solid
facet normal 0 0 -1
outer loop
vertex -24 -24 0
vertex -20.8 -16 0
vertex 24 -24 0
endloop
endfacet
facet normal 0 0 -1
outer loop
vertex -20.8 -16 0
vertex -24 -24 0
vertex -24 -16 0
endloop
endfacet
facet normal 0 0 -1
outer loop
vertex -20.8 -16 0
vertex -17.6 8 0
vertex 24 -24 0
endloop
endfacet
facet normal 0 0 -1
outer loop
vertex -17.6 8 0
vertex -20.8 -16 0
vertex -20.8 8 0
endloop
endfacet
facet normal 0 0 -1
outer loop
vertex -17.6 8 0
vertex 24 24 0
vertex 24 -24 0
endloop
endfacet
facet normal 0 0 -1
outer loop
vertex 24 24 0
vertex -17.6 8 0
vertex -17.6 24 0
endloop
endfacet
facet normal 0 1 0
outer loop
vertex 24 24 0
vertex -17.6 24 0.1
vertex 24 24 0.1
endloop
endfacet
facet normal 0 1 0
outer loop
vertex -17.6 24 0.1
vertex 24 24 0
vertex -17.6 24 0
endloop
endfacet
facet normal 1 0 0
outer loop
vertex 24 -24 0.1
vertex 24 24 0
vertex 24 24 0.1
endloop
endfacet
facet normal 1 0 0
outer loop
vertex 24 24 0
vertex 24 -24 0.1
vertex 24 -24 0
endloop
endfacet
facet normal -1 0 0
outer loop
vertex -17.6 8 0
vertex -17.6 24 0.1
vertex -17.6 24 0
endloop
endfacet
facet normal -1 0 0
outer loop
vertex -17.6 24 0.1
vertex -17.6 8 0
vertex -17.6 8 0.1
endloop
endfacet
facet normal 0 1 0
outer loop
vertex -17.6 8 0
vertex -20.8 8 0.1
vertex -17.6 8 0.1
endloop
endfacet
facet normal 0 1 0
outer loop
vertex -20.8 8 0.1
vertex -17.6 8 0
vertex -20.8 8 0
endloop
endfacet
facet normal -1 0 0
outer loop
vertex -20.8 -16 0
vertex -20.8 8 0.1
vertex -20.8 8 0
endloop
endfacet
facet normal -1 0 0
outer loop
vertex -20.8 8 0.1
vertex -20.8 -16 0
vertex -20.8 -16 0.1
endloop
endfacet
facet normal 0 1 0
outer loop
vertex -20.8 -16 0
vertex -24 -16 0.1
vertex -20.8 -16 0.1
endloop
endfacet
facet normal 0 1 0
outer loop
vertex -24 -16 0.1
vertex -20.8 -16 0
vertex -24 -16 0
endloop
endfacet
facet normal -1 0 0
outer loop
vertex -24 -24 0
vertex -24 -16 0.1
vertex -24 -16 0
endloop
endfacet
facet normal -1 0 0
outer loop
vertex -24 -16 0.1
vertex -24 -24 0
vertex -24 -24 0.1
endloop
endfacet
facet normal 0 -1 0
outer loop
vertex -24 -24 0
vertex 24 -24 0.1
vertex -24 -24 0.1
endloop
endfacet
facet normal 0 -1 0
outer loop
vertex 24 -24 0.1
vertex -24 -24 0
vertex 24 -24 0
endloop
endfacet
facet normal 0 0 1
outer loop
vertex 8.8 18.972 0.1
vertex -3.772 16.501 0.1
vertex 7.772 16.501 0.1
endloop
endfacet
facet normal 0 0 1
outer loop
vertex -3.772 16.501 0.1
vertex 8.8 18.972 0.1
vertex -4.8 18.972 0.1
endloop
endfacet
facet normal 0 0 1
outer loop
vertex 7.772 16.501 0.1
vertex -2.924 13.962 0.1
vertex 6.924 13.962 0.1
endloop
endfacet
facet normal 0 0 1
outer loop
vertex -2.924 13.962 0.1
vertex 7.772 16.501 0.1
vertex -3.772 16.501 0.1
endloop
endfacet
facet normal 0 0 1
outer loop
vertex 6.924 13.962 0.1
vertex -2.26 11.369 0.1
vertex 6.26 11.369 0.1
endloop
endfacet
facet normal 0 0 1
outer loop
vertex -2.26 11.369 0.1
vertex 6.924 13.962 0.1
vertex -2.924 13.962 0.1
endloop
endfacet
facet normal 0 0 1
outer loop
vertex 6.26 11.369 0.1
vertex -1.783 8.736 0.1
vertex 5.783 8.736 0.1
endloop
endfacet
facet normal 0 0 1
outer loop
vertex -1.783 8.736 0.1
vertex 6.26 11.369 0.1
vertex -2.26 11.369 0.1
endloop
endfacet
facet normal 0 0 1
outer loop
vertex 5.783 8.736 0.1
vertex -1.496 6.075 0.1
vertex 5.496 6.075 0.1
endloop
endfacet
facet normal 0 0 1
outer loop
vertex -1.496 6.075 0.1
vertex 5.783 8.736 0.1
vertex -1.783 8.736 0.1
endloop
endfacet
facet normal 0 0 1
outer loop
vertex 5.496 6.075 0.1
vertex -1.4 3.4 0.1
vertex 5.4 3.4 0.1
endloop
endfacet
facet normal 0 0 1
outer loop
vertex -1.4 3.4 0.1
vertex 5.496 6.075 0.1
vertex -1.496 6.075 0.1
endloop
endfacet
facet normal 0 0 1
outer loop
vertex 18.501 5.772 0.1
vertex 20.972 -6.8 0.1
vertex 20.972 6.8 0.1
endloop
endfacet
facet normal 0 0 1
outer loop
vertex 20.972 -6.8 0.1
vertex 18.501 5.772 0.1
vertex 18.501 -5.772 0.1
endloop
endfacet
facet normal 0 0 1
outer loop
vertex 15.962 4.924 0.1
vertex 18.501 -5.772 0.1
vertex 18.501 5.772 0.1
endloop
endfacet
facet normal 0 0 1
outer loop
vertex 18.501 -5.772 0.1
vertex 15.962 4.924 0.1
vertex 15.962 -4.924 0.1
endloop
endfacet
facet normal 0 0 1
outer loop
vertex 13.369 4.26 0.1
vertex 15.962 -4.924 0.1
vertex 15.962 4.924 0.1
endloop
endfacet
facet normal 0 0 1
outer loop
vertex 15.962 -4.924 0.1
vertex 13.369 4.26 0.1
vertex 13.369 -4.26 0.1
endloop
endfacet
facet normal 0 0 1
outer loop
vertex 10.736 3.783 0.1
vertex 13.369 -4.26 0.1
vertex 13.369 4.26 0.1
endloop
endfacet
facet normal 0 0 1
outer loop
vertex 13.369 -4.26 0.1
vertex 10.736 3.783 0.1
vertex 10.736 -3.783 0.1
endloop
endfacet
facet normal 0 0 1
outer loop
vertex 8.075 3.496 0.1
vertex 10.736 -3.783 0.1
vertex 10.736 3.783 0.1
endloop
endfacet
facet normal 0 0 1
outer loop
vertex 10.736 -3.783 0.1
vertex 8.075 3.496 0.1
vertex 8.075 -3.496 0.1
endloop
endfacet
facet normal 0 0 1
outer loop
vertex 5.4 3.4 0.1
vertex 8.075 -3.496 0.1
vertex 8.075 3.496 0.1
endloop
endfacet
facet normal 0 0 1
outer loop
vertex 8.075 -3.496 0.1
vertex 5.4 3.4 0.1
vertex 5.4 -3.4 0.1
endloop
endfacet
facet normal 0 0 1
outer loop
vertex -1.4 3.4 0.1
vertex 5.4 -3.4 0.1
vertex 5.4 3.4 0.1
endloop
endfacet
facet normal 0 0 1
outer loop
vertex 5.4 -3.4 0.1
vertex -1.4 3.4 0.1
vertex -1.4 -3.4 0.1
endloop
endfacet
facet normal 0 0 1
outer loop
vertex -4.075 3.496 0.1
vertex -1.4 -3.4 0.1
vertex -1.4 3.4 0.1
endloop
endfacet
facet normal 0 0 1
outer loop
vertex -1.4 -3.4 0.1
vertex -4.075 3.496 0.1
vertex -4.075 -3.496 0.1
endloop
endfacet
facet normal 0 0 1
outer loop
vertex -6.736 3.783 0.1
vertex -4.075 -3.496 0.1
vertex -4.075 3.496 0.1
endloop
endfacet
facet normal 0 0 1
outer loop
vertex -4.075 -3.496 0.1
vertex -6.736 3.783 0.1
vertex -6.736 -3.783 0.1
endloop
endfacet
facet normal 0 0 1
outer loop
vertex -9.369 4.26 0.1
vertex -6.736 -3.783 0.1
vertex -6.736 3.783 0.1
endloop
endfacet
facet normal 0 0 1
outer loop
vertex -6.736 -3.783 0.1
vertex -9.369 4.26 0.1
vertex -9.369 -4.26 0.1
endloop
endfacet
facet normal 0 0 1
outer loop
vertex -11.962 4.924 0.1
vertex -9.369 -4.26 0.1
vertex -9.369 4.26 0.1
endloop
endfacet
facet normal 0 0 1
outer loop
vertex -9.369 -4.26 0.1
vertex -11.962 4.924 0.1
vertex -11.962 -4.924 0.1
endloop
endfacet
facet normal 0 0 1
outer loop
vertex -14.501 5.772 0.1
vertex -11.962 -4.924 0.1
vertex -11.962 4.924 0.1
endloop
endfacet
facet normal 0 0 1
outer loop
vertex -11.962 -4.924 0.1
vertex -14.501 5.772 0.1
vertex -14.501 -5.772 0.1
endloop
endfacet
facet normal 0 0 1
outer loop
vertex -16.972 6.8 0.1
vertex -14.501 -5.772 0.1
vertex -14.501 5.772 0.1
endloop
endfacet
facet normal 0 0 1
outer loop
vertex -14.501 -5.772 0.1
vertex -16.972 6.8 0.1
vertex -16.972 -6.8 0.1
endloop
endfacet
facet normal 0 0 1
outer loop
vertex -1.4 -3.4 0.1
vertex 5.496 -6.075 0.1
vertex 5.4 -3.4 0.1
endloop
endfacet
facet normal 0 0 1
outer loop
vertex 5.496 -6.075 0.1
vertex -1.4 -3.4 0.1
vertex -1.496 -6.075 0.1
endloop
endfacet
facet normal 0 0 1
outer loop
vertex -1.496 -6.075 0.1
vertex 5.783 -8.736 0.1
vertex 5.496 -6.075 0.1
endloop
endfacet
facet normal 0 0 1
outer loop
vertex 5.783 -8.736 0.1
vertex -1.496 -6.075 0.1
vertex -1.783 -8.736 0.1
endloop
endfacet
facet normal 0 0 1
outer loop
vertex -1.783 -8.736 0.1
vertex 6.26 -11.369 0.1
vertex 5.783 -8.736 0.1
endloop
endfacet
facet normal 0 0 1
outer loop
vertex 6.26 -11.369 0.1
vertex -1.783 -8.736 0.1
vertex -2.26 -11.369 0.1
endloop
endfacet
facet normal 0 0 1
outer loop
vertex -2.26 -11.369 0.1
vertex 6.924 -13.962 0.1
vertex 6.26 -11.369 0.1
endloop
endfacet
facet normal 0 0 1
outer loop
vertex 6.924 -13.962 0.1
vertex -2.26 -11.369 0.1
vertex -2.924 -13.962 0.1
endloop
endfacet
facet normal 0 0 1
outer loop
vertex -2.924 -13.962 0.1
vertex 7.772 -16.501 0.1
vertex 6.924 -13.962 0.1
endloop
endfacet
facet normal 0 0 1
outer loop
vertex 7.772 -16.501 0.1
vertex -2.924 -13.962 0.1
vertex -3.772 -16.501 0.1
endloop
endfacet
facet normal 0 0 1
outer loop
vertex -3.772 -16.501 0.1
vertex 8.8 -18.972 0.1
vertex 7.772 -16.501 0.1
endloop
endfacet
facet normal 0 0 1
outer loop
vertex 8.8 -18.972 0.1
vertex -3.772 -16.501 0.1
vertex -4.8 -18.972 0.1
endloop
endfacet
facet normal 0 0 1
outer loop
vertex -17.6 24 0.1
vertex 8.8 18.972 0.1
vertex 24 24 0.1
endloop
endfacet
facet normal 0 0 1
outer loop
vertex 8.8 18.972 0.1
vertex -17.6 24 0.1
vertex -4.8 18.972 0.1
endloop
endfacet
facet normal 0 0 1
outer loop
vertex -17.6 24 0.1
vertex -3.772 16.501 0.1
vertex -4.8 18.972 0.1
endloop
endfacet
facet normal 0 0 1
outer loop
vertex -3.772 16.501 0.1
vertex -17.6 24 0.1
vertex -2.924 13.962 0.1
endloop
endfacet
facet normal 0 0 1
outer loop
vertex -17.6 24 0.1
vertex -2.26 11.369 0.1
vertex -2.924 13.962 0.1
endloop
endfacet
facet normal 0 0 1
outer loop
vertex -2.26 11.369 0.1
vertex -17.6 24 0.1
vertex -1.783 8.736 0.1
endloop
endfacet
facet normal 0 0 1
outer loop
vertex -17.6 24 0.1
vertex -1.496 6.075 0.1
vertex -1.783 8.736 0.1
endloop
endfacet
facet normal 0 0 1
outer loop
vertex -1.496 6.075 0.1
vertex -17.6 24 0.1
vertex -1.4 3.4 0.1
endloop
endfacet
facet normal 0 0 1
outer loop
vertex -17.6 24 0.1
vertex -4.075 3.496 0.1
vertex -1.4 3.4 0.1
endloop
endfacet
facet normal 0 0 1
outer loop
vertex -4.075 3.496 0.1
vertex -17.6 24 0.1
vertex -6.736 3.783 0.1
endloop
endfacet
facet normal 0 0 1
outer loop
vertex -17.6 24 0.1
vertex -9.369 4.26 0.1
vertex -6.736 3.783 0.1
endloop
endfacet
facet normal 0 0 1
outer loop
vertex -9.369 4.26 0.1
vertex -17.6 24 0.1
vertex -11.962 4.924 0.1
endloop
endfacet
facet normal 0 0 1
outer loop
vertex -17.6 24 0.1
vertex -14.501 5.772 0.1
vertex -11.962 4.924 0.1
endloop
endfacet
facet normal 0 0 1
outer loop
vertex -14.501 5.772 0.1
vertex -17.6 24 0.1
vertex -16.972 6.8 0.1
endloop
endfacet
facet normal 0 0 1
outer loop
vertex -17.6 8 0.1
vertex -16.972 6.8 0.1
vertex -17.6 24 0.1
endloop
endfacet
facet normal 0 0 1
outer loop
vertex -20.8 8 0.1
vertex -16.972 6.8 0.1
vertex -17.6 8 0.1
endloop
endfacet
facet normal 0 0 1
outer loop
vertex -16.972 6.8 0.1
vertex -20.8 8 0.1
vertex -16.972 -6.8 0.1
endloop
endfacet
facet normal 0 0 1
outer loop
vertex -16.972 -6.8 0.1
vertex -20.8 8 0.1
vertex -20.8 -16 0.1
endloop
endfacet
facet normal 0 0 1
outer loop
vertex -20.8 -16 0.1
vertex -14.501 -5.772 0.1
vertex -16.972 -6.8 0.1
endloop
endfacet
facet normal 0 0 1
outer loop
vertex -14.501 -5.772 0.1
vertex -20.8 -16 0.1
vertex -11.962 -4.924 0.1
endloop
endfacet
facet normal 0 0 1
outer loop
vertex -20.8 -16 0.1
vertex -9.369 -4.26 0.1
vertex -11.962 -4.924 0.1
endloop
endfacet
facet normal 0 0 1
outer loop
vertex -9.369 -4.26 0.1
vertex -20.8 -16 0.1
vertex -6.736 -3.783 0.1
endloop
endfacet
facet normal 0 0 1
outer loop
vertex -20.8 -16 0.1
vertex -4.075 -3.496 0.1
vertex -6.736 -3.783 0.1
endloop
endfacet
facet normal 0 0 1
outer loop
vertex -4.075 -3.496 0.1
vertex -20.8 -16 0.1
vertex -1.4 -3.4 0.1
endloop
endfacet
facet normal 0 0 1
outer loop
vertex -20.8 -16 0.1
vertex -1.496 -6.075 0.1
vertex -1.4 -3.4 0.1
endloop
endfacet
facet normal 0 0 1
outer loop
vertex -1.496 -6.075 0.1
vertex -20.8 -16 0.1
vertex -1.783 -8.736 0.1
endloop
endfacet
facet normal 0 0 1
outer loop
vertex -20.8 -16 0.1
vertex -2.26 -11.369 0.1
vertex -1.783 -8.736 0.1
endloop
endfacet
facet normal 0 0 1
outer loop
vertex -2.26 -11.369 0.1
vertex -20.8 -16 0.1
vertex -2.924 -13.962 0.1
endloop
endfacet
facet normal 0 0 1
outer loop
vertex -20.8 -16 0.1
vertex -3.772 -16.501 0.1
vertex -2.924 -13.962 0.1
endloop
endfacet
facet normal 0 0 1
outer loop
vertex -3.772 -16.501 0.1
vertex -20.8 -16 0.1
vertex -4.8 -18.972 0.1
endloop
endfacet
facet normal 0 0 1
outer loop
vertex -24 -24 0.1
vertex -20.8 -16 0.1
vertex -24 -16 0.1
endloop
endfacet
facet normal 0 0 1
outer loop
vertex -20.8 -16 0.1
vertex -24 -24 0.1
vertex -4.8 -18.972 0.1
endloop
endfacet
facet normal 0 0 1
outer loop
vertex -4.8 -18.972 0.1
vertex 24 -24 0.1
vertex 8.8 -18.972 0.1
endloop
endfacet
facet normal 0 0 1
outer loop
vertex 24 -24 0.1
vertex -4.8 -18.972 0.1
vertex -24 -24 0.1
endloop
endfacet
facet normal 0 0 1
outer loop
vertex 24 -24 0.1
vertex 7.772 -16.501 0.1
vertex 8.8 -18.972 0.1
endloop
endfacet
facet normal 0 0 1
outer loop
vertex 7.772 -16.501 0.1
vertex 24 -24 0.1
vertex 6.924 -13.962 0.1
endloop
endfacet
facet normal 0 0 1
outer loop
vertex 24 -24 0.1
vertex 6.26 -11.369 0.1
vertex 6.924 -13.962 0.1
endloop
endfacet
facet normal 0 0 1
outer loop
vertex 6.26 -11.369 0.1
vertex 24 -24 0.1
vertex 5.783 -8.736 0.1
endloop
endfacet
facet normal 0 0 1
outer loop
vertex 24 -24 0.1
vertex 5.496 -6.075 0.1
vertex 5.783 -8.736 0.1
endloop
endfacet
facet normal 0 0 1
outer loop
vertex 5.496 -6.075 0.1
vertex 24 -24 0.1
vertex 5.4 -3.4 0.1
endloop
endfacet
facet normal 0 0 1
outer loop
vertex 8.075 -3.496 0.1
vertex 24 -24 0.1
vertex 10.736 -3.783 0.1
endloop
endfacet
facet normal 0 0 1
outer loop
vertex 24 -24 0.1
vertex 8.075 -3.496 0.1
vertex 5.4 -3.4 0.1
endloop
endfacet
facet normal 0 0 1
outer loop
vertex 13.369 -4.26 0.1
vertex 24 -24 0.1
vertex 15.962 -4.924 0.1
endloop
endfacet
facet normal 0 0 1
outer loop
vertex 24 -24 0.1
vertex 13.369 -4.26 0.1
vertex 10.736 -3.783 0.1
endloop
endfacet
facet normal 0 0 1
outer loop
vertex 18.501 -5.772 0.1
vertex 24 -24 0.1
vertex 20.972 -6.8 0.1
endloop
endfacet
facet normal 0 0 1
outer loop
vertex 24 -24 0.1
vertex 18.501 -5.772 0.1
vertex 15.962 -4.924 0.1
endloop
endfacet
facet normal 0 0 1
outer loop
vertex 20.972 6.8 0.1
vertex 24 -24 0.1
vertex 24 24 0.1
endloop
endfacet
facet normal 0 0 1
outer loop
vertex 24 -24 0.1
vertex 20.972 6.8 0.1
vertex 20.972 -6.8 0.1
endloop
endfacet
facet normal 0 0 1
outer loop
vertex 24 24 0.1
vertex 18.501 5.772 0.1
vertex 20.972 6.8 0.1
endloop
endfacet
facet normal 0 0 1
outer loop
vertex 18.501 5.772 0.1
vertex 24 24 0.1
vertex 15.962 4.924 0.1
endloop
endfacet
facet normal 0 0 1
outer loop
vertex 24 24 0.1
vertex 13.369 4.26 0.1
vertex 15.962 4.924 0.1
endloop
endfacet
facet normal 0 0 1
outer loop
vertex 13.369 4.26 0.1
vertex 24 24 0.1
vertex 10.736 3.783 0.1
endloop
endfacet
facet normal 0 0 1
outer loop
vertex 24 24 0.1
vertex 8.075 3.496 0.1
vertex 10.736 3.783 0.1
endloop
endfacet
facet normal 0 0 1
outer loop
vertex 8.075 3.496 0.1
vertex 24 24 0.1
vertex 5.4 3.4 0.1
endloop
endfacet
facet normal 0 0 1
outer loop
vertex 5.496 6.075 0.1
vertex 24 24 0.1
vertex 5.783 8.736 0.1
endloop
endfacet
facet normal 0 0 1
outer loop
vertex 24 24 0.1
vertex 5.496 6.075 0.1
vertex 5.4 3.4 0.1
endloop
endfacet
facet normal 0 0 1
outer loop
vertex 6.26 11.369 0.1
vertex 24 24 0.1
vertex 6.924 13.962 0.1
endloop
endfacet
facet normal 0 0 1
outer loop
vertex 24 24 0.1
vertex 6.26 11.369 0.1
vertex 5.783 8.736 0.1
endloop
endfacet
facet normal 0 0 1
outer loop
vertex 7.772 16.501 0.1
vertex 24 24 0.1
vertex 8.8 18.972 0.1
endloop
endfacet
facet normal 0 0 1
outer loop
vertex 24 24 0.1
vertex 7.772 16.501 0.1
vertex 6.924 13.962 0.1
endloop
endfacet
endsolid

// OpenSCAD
use <../lib.scad>
use <4179107c.scad>
function ldraw_lib__4179107e() = [
// 0 Sticker  6.0 x  6.0 with Black Iron Cross on White Background Left
// 0 Name: 4179107e.dat
// 0 Author: Massimo Maso [Sirio]
// 0 !LDRAW_ORG Part UPDATE 2022-06
// 0 !LICENSE Licensed under CC BY 4.0 : see CAreadme.txt
// 
// 0 BFC CERTIFY CCW
  [0,"BFC","CERTIFY"],
  [0,"BFC","CCW"],
// 
// 0 !KEYWORDS Bricklink 10024stk01, Brickowl 275196, Fokker Dr. I
// 0 !KEYWORDS Rebrickable 44236, Red Baron, Sculptures, Set 10024, Triplane
// 
// 0 !HISTORY 2022-12-20 [PTadmin] Official Update 2022-06
// 
// 
// 1 16 0 0 0 -1 0 0 0 1 0 0 0 1 4179107c.dat
  [1,16,0,0,0,-1,0,0,0,1,0,0,0,1, ldraw_lib__4179107c()],
];
module ldraw_lib__4179107e(step=0, col=false, unit=2/5, alt=false, line=0.2, solid=!$preview)
    makepoly(ldraw_lib__4179107e(), step=step, col=col, unit=unit, alt=alt, line=line, solid=solid);
ldraw_lib__4179107e(line=0.2);
